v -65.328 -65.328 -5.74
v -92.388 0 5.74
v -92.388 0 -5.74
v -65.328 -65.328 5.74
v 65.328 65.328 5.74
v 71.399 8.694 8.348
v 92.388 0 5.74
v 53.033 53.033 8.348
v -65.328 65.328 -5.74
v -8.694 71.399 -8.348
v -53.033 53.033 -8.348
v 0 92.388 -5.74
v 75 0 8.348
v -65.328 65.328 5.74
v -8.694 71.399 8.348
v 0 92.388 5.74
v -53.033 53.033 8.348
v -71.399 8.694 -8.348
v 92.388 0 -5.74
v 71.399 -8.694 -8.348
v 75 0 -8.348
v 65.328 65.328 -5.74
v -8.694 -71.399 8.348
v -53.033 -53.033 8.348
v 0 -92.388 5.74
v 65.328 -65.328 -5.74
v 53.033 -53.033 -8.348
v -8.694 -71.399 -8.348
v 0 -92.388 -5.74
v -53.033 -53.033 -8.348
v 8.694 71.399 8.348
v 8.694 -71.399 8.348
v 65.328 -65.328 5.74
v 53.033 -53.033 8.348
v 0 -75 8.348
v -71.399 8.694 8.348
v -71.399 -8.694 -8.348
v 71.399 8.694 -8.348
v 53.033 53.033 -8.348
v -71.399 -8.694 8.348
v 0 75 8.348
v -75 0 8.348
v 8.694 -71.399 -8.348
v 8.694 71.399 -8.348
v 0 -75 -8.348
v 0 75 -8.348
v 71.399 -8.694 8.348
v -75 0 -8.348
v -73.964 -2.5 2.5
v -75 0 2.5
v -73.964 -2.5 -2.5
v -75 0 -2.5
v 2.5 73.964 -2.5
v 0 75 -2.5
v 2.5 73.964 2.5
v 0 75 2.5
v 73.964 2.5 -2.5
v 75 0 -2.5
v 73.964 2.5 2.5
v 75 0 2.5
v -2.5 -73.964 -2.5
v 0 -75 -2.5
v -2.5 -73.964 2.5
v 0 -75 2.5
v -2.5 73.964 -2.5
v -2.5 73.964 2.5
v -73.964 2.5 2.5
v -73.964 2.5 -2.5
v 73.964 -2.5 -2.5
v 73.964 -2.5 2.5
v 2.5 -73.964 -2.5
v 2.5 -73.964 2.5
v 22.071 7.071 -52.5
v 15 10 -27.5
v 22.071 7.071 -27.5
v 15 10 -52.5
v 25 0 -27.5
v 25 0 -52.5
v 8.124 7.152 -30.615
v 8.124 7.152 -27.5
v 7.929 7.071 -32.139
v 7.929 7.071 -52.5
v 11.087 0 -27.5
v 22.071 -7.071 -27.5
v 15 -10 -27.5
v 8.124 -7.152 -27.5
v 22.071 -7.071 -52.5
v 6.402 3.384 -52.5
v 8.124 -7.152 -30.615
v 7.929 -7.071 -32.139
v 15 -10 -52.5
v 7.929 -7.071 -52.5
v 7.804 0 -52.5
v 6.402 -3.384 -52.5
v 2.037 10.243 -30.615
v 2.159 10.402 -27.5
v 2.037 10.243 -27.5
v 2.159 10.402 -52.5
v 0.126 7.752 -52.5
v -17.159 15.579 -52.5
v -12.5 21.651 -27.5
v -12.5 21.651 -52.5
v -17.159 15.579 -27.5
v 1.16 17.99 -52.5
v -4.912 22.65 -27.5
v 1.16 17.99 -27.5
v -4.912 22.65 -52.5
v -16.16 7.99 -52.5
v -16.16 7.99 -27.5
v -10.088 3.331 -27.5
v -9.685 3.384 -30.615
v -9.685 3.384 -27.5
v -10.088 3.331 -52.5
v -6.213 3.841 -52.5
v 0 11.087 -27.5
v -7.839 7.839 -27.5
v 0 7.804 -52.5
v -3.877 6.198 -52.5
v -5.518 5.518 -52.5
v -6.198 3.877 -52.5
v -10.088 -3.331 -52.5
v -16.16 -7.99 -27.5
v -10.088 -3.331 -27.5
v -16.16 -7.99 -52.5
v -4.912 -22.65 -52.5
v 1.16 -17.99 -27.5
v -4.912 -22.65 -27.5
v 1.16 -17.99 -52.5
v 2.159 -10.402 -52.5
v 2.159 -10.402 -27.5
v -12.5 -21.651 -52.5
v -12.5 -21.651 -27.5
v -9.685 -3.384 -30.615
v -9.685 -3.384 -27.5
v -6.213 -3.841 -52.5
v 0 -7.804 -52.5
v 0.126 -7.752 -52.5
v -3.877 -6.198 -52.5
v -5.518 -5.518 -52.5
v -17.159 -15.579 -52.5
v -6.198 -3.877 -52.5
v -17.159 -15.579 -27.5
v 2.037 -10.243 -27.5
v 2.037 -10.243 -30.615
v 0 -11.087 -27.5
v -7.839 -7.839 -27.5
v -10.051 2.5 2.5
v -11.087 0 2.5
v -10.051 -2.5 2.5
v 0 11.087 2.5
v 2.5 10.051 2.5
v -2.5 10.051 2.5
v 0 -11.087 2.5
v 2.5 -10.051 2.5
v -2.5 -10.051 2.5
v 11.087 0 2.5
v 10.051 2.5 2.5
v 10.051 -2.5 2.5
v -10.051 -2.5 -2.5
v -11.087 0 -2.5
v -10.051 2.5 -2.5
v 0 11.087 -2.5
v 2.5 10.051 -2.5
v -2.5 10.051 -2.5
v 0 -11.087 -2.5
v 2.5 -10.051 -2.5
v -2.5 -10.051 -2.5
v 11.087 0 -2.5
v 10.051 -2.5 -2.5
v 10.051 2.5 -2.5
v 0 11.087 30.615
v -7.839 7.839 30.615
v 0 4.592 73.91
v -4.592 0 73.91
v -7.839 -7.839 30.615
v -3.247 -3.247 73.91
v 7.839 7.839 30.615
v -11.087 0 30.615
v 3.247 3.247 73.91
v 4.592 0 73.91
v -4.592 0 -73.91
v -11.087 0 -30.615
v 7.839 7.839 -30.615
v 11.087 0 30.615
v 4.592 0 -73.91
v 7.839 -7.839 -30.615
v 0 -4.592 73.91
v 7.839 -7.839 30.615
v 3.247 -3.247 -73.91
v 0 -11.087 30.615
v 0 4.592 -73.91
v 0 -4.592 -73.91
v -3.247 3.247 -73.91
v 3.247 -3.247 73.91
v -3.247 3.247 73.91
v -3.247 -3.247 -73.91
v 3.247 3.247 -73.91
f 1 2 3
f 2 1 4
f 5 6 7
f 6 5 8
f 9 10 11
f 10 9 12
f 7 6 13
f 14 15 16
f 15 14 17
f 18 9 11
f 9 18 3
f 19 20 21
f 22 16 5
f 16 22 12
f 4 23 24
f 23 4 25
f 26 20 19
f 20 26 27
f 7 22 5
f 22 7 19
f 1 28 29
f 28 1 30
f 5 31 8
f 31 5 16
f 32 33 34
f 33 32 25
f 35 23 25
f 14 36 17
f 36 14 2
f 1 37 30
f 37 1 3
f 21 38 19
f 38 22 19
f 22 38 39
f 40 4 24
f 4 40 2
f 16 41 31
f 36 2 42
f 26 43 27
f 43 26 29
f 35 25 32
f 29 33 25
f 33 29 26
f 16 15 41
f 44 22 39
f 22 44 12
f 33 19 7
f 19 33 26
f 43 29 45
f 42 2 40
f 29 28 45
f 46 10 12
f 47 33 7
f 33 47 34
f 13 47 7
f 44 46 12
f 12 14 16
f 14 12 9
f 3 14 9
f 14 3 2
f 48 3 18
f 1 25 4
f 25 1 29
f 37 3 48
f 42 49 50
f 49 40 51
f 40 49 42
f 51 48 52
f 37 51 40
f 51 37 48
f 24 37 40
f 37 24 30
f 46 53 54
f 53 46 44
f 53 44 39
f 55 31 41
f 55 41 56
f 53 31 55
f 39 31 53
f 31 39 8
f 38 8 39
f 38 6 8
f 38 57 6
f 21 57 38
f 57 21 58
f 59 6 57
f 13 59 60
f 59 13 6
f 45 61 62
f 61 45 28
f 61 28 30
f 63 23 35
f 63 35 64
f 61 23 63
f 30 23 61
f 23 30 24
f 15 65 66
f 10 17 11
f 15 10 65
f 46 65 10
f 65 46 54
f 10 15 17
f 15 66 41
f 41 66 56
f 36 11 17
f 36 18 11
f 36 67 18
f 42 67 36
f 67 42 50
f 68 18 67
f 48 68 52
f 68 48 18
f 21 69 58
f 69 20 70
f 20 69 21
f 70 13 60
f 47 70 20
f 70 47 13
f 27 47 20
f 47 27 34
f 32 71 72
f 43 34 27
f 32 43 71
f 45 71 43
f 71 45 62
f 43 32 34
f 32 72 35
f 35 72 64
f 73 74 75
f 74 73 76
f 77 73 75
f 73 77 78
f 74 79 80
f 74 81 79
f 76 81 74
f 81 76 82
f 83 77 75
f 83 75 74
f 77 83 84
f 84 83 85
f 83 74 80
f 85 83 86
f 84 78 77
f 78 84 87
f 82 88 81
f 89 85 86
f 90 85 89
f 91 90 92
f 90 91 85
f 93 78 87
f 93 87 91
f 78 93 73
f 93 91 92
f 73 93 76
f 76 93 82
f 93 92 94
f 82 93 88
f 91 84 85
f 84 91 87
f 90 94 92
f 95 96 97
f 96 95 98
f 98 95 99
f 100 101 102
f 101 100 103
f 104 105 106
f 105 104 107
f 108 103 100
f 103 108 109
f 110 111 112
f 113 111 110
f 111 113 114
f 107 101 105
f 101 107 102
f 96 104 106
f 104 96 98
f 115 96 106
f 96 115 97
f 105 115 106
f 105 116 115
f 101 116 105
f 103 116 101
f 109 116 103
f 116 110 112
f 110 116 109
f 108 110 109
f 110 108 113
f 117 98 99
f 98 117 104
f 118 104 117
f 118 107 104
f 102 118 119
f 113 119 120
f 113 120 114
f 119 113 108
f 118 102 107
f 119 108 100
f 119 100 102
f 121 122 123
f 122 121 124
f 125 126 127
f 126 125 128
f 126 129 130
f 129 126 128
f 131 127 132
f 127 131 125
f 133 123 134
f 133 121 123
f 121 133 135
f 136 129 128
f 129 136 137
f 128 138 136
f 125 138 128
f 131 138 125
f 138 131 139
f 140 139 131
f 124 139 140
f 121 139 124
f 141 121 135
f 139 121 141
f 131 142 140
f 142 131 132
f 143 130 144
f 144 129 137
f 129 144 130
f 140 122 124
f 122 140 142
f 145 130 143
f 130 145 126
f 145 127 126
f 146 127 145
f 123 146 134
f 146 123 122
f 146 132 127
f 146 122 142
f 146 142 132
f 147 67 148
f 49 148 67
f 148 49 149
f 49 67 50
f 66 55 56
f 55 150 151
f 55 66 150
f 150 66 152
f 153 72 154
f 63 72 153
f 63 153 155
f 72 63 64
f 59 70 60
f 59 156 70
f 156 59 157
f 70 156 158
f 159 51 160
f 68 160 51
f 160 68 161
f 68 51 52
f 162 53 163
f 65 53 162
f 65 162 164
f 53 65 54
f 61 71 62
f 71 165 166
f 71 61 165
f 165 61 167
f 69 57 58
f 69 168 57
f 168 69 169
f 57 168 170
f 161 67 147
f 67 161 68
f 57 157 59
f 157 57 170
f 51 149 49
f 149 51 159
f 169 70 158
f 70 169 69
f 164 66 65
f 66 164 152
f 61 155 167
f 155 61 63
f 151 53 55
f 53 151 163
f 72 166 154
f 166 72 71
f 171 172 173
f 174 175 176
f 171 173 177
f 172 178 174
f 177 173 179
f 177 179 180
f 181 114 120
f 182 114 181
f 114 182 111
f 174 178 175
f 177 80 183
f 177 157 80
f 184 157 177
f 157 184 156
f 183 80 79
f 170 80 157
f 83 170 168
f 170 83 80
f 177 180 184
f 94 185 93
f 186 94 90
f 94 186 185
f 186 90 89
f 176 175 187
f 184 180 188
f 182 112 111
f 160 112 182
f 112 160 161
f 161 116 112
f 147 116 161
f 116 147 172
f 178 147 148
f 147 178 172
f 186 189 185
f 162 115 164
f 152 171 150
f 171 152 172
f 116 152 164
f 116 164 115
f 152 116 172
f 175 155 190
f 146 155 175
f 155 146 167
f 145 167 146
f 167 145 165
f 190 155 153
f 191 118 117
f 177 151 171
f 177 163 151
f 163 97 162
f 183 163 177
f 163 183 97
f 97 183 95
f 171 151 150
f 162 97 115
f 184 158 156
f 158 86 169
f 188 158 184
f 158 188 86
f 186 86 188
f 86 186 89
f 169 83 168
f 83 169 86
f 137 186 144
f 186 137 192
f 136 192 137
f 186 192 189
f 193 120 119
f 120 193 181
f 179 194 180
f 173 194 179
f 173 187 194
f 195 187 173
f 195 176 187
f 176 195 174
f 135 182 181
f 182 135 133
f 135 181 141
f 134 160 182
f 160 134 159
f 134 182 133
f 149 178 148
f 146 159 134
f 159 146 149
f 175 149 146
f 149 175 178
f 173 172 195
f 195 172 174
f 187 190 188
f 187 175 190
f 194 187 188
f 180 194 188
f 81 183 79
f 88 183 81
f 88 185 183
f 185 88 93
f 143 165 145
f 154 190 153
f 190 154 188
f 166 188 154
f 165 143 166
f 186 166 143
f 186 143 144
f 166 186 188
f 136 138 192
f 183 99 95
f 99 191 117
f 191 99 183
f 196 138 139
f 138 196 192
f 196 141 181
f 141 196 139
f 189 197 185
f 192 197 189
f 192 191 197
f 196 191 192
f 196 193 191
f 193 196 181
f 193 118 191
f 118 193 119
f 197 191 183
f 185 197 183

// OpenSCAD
$fn = 8;

scale(v = [5, 5, 5])
union() {
	difference() {
		scale(v = [1, 1, 0.15])
			sphere(r = 20);
		cylinder(h = 10, r1 = 15, r2 = 15, center = true);
	}
	cube(size = [35, 1, 1], center = true);
	rotate(a = 90, v = [0, 0, 1])
		cube(size = [35, 1, 1], center = true);
	scale(v = [0.3, 0.3, 2])
	sphere(r = 8, center = true);
	translate(v = [0, 0, -8]) {
		translate(v = [3, 0, 0])
			cylinder(h = 5, r1 = 2, r2 = 2, center = true);
		rotate(a = 360 / 3.0, v = [0, 0, 1])
			translate(v = [3, 0, 0])
				cylinder(h = 5, r1 = 2, r2 = 2, center = true);
		rotate(a = -360 / 3.0, v = [0, 0, 1])
			translate(v = [3, 0, 0])
				cylinder(h = 5, r1 = 2, r2 = 2, center = true);
	}
}
